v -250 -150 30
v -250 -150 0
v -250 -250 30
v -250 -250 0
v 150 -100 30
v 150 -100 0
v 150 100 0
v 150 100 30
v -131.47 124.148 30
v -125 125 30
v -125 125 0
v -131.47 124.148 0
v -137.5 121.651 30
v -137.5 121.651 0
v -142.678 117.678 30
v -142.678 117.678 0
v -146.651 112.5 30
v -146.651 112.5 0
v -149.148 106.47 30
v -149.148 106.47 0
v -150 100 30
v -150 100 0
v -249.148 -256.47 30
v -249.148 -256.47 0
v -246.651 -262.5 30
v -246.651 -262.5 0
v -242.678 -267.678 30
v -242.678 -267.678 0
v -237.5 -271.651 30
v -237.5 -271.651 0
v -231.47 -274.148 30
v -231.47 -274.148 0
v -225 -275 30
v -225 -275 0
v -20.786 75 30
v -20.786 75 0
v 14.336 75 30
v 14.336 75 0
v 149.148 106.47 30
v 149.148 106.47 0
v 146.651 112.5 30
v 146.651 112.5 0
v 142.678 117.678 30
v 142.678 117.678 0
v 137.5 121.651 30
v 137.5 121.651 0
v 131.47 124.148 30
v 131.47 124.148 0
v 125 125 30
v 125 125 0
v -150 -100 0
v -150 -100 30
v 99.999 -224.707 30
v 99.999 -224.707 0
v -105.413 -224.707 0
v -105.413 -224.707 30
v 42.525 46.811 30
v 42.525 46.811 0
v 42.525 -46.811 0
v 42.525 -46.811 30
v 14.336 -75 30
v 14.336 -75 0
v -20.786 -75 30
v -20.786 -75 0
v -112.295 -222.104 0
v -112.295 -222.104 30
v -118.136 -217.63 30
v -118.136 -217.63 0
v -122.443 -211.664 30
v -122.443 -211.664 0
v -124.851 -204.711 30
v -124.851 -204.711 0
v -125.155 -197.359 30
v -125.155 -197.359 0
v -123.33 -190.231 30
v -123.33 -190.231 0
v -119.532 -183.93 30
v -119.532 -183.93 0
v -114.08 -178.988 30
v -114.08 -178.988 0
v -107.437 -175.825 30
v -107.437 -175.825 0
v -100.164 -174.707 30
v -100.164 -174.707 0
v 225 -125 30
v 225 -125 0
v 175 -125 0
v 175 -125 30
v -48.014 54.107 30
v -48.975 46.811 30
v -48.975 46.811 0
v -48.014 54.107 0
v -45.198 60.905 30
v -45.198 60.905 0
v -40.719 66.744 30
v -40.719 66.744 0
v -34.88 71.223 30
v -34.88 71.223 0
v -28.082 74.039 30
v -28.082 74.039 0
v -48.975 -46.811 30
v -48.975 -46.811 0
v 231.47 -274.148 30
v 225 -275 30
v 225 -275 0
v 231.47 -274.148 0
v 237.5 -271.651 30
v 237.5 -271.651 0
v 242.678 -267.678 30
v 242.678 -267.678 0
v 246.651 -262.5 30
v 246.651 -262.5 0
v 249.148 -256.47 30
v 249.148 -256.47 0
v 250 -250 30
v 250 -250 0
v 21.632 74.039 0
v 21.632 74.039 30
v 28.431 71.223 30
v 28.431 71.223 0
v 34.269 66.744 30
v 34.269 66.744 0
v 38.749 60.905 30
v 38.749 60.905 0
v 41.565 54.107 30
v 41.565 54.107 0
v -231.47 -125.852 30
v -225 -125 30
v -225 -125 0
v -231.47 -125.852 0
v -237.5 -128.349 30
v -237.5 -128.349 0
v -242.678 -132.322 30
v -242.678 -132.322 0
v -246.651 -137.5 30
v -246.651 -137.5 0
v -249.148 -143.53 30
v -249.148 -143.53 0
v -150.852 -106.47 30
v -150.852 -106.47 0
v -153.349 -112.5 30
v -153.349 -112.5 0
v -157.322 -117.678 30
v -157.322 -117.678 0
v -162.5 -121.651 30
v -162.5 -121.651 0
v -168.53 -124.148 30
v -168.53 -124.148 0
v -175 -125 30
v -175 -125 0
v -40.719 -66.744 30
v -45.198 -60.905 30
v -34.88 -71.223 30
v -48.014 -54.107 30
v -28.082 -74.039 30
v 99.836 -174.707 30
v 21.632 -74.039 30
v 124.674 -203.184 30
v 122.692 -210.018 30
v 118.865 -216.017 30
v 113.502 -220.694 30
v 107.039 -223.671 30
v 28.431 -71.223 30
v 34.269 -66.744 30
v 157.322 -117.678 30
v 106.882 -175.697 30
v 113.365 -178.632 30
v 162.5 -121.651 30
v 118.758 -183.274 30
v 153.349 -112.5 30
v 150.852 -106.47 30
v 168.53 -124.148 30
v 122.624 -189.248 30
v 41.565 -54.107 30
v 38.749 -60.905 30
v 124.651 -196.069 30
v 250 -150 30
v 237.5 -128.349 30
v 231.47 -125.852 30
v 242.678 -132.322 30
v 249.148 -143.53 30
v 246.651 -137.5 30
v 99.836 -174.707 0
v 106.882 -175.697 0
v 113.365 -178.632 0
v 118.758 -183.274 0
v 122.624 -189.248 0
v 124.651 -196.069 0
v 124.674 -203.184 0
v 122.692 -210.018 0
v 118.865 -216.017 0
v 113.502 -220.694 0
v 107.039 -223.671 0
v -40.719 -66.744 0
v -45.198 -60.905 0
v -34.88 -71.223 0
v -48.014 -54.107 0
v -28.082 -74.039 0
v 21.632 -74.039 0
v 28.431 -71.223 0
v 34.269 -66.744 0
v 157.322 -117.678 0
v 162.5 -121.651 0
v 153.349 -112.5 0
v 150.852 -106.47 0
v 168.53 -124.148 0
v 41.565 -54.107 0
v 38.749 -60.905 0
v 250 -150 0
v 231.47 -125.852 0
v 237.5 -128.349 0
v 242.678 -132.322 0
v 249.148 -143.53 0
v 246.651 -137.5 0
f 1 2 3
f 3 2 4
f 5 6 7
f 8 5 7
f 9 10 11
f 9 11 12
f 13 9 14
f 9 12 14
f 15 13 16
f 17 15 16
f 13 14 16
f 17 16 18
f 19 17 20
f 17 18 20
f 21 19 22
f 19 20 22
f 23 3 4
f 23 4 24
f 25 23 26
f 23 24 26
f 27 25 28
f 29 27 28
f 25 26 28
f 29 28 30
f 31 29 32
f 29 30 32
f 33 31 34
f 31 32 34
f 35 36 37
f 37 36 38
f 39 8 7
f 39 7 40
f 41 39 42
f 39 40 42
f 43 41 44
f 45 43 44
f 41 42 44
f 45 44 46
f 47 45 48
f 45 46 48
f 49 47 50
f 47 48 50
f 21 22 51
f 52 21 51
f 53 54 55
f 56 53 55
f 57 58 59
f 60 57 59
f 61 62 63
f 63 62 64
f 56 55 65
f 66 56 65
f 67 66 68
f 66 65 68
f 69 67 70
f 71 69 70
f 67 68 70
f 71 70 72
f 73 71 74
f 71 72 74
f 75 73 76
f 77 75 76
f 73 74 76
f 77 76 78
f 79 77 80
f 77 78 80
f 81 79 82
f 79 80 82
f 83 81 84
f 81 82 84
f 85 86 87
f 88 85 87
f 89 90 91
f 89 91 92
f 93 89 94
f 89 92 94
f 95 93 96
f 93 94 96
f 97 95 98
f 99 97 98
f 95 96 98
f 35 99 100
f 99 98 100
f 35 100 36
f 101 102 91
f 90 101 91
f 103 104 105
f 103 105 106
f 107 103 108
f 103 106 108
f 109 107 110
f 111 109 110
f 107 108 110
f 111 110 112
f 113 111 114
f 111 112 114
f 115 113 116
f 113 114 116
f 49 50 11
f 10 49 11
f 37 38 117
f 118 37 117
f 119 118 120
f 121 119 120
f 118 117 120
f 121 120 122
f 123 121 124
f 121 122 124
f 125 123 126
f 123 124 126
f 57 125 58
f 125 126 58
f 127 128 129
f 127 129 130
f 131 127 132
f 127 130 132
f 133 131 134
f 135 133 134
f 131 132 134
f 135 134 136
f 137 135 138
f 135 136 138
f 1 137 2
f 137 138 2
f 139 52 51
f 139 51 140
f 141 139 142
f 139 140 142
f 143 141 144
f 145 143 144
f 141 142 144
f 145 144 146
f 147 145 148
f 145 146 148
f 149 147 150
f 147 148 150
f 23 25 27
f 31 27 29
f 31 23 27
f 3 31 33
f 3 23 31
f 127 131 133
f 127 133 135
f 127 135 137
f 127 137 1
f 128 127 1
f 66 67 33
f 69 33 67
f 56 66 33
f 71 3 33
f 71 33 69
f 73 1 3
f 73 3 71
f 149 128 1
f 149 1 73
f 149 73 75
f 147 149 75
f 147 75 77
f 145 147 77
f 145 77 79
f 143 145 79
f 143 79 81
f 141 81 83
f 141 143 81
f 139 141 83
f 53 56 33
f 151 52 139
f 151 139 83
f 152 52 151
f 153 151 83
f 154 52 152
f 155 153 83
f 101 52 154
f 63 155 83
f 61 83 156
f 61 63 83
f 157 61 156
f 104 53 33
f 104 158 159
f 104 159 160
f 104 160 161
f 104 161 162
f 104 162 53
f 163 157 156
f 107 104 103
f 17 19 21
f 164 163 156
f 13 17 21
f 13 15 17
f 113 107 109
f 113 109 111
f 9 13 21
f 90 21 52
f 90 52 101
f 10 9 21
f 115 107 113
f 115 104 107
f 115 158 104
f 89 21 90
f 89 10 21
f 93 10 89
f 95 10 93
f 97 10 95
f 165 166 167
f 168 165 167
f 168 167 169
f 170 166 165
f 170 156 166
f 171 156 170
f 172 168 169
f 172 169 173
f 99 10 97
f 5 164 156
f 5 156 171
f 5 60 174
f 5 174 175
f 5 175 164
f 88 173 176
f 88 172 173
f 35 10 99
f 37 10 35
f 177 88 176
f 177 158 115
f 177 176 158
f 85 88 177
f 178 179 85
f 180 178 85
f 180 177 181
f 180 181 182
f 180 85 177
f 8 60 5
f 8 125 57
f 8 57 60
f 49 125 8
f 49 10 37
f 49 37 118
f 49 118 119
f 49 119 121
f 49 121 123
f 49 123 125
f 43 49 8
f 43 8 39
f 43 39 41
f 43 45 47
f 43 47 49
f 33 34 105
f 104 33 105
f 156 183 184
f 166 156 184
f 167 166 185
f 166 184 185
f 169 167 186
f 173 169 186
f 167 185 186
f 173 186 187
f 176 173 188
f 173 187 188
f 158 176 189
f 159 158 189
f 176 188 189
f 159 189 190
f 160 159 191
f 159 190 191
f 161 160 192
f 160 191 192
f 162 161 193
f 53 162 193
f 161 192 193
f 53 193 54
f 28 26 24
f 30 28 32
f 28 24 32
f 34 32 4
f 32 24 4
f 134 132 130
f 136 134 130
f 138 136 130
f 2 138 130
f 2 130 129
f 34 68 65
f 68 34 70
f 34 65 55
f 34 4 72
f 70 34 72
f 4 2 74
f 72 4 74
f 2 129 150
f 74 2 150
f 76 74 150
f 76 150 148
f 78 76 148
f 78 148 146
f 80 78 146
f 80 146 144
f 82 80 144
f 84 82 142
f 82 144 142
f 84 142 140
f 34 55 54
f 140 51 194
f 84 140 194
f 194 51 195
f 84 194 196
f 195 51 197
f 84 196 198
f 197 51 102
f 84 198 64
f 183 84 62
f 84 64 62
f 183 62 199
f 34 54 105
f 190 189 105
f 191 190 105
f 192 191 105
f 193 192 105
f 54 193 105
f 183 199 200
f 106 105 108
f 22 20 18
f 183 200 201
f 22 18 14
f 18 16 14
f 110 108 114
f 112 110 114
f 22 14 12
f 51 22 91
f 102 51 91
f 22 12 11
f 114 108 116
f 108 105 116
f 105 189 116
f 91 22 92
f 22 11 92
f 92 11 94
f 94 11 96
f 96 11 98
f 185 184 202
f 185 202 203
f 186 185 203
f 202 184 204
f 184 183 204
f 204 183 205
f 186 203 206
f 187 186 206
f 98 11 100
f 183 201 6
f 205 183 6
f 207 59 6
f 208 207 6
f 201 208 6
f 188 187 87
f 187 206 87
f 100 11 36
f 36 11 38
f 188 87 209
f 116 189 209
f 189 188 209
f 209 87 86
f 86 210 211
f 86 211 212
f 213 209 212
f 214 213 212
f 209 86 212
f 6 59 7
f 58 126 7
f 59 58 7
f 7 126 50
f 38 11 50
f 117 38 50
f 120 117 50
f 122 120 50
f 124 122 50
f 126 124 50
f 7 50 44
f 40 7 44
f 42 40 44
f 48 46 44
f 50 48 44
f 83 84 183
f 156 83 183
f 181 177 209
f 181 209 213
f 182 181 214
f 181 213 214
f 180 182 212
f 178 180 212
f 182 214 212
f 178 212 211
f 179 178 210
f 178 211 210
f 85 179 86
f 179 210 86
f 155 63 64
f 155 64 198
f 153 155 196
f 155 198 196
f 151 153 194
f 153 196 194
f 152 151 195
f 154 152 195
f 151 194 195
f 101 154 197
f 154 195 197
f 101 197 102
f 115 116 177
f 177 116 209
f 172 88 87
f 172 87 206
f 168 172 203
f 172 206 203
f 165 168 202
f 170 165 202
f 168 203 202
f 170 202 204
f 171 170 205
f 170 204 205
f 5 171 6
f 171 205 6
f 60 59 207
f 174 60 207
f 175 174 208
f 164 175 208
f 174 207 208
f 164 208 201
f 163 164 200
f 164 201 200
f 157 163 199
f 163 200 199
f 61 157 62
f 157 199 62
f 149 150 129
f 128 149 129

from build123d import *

# Parameters (mm, degrees)
BOSS_EXTRUDE1_DEPTH = 30


with BuildPart() as part:
    # Sketch1 → Boss-Extrude1 (new body)
    with BuildSketch(Plane.XY):
        with BuildLine():
            Line((-175, -125), (-225, -125))
            ThreePointArc((-225, -125), (-242.67766953, -132.32233047), (-250, -150))
            Line((-250, -150), (-250, -250))
            ThreePointArc((-250, -250), (-242.67766953, -267.67766953), (-225, -275))
            Line((-225, -275), (225, -275))
            ThreePointArc((225, -275), (242.67766953, -267.67766953), (250, -250))
            Line((250, -250), (250, -150))
            ThreePointArc((250, -150), (242.67766953, -132.32233047), (225, -125))
            Line((225, -125), (175, -125))
            ThreePointArc((175, -125), (157.32233047, -117.67766953), (150, -100))
            Line((150, -100), (150, 100))
            ThreePointArc((150, 100), (142.67766953, 117.67766953), (125, 125))
            Line((125, 125), (-125, 125))
            ThreePointArc((-125, 125), (-142.67766953, 117.67766953), (-150, 100))
            Line((-150, 100), (-150, -100))
            ThreePointArc((-150, -100), (-157.32233047, -117.67766953), (-175, -125))
        make_face()
        with BuildLine():
            Line((-20.785894669, 75), (14.336083622, 75))
            ThreePointArc((14.336083622, 75), (34.268791925, 66.743601886), (42.525190039, 46.810893583))
            Line((42.525190039, 46.810893583), (42.525190039, -46.810893583))
            ThreePointArc((42.525190039, -46.810893583), (34.268791925, -66.743601886), (14.336083622, -75))
            Line((14.336083622, -75), (-20.785894669, -75))
            ThreePointArc((-20.785894669, -75), (-40.718602973, -66.743601886), (-48.975001087, -46.810893583))
            Line((-48.975001087, -46.810893583), (-48.975001087, 46.810893583))
            ThreePointArc((-48.975001087, 46.810893583), (-40.718602973, 66.743601886), (-20.785894669, 75))
        make_face(mode=Mode.SUBTRACT)
        with BuildLine():
            Line((-100.16408543, -174.707408676), (99.83591457, -174.707408676))
            ThreePointArc((99.83591457, -174.707408676), (124.917346487, -199.625710645), (99.999044519, -224.707142562))
            Line((99.999044519, -224.707142562), (-105.412874128, -224.707142562))
            ThreePointArc((-105.412874128, -224.707142562), (-125.154899456, -197.359330907), (-100.16408543, -174.707408676))
        make_face(mode=Mode.SUBTRACT)
    extrude(amount=BOSS_EXTRUDE1_DEPTH)


solid = part.part
